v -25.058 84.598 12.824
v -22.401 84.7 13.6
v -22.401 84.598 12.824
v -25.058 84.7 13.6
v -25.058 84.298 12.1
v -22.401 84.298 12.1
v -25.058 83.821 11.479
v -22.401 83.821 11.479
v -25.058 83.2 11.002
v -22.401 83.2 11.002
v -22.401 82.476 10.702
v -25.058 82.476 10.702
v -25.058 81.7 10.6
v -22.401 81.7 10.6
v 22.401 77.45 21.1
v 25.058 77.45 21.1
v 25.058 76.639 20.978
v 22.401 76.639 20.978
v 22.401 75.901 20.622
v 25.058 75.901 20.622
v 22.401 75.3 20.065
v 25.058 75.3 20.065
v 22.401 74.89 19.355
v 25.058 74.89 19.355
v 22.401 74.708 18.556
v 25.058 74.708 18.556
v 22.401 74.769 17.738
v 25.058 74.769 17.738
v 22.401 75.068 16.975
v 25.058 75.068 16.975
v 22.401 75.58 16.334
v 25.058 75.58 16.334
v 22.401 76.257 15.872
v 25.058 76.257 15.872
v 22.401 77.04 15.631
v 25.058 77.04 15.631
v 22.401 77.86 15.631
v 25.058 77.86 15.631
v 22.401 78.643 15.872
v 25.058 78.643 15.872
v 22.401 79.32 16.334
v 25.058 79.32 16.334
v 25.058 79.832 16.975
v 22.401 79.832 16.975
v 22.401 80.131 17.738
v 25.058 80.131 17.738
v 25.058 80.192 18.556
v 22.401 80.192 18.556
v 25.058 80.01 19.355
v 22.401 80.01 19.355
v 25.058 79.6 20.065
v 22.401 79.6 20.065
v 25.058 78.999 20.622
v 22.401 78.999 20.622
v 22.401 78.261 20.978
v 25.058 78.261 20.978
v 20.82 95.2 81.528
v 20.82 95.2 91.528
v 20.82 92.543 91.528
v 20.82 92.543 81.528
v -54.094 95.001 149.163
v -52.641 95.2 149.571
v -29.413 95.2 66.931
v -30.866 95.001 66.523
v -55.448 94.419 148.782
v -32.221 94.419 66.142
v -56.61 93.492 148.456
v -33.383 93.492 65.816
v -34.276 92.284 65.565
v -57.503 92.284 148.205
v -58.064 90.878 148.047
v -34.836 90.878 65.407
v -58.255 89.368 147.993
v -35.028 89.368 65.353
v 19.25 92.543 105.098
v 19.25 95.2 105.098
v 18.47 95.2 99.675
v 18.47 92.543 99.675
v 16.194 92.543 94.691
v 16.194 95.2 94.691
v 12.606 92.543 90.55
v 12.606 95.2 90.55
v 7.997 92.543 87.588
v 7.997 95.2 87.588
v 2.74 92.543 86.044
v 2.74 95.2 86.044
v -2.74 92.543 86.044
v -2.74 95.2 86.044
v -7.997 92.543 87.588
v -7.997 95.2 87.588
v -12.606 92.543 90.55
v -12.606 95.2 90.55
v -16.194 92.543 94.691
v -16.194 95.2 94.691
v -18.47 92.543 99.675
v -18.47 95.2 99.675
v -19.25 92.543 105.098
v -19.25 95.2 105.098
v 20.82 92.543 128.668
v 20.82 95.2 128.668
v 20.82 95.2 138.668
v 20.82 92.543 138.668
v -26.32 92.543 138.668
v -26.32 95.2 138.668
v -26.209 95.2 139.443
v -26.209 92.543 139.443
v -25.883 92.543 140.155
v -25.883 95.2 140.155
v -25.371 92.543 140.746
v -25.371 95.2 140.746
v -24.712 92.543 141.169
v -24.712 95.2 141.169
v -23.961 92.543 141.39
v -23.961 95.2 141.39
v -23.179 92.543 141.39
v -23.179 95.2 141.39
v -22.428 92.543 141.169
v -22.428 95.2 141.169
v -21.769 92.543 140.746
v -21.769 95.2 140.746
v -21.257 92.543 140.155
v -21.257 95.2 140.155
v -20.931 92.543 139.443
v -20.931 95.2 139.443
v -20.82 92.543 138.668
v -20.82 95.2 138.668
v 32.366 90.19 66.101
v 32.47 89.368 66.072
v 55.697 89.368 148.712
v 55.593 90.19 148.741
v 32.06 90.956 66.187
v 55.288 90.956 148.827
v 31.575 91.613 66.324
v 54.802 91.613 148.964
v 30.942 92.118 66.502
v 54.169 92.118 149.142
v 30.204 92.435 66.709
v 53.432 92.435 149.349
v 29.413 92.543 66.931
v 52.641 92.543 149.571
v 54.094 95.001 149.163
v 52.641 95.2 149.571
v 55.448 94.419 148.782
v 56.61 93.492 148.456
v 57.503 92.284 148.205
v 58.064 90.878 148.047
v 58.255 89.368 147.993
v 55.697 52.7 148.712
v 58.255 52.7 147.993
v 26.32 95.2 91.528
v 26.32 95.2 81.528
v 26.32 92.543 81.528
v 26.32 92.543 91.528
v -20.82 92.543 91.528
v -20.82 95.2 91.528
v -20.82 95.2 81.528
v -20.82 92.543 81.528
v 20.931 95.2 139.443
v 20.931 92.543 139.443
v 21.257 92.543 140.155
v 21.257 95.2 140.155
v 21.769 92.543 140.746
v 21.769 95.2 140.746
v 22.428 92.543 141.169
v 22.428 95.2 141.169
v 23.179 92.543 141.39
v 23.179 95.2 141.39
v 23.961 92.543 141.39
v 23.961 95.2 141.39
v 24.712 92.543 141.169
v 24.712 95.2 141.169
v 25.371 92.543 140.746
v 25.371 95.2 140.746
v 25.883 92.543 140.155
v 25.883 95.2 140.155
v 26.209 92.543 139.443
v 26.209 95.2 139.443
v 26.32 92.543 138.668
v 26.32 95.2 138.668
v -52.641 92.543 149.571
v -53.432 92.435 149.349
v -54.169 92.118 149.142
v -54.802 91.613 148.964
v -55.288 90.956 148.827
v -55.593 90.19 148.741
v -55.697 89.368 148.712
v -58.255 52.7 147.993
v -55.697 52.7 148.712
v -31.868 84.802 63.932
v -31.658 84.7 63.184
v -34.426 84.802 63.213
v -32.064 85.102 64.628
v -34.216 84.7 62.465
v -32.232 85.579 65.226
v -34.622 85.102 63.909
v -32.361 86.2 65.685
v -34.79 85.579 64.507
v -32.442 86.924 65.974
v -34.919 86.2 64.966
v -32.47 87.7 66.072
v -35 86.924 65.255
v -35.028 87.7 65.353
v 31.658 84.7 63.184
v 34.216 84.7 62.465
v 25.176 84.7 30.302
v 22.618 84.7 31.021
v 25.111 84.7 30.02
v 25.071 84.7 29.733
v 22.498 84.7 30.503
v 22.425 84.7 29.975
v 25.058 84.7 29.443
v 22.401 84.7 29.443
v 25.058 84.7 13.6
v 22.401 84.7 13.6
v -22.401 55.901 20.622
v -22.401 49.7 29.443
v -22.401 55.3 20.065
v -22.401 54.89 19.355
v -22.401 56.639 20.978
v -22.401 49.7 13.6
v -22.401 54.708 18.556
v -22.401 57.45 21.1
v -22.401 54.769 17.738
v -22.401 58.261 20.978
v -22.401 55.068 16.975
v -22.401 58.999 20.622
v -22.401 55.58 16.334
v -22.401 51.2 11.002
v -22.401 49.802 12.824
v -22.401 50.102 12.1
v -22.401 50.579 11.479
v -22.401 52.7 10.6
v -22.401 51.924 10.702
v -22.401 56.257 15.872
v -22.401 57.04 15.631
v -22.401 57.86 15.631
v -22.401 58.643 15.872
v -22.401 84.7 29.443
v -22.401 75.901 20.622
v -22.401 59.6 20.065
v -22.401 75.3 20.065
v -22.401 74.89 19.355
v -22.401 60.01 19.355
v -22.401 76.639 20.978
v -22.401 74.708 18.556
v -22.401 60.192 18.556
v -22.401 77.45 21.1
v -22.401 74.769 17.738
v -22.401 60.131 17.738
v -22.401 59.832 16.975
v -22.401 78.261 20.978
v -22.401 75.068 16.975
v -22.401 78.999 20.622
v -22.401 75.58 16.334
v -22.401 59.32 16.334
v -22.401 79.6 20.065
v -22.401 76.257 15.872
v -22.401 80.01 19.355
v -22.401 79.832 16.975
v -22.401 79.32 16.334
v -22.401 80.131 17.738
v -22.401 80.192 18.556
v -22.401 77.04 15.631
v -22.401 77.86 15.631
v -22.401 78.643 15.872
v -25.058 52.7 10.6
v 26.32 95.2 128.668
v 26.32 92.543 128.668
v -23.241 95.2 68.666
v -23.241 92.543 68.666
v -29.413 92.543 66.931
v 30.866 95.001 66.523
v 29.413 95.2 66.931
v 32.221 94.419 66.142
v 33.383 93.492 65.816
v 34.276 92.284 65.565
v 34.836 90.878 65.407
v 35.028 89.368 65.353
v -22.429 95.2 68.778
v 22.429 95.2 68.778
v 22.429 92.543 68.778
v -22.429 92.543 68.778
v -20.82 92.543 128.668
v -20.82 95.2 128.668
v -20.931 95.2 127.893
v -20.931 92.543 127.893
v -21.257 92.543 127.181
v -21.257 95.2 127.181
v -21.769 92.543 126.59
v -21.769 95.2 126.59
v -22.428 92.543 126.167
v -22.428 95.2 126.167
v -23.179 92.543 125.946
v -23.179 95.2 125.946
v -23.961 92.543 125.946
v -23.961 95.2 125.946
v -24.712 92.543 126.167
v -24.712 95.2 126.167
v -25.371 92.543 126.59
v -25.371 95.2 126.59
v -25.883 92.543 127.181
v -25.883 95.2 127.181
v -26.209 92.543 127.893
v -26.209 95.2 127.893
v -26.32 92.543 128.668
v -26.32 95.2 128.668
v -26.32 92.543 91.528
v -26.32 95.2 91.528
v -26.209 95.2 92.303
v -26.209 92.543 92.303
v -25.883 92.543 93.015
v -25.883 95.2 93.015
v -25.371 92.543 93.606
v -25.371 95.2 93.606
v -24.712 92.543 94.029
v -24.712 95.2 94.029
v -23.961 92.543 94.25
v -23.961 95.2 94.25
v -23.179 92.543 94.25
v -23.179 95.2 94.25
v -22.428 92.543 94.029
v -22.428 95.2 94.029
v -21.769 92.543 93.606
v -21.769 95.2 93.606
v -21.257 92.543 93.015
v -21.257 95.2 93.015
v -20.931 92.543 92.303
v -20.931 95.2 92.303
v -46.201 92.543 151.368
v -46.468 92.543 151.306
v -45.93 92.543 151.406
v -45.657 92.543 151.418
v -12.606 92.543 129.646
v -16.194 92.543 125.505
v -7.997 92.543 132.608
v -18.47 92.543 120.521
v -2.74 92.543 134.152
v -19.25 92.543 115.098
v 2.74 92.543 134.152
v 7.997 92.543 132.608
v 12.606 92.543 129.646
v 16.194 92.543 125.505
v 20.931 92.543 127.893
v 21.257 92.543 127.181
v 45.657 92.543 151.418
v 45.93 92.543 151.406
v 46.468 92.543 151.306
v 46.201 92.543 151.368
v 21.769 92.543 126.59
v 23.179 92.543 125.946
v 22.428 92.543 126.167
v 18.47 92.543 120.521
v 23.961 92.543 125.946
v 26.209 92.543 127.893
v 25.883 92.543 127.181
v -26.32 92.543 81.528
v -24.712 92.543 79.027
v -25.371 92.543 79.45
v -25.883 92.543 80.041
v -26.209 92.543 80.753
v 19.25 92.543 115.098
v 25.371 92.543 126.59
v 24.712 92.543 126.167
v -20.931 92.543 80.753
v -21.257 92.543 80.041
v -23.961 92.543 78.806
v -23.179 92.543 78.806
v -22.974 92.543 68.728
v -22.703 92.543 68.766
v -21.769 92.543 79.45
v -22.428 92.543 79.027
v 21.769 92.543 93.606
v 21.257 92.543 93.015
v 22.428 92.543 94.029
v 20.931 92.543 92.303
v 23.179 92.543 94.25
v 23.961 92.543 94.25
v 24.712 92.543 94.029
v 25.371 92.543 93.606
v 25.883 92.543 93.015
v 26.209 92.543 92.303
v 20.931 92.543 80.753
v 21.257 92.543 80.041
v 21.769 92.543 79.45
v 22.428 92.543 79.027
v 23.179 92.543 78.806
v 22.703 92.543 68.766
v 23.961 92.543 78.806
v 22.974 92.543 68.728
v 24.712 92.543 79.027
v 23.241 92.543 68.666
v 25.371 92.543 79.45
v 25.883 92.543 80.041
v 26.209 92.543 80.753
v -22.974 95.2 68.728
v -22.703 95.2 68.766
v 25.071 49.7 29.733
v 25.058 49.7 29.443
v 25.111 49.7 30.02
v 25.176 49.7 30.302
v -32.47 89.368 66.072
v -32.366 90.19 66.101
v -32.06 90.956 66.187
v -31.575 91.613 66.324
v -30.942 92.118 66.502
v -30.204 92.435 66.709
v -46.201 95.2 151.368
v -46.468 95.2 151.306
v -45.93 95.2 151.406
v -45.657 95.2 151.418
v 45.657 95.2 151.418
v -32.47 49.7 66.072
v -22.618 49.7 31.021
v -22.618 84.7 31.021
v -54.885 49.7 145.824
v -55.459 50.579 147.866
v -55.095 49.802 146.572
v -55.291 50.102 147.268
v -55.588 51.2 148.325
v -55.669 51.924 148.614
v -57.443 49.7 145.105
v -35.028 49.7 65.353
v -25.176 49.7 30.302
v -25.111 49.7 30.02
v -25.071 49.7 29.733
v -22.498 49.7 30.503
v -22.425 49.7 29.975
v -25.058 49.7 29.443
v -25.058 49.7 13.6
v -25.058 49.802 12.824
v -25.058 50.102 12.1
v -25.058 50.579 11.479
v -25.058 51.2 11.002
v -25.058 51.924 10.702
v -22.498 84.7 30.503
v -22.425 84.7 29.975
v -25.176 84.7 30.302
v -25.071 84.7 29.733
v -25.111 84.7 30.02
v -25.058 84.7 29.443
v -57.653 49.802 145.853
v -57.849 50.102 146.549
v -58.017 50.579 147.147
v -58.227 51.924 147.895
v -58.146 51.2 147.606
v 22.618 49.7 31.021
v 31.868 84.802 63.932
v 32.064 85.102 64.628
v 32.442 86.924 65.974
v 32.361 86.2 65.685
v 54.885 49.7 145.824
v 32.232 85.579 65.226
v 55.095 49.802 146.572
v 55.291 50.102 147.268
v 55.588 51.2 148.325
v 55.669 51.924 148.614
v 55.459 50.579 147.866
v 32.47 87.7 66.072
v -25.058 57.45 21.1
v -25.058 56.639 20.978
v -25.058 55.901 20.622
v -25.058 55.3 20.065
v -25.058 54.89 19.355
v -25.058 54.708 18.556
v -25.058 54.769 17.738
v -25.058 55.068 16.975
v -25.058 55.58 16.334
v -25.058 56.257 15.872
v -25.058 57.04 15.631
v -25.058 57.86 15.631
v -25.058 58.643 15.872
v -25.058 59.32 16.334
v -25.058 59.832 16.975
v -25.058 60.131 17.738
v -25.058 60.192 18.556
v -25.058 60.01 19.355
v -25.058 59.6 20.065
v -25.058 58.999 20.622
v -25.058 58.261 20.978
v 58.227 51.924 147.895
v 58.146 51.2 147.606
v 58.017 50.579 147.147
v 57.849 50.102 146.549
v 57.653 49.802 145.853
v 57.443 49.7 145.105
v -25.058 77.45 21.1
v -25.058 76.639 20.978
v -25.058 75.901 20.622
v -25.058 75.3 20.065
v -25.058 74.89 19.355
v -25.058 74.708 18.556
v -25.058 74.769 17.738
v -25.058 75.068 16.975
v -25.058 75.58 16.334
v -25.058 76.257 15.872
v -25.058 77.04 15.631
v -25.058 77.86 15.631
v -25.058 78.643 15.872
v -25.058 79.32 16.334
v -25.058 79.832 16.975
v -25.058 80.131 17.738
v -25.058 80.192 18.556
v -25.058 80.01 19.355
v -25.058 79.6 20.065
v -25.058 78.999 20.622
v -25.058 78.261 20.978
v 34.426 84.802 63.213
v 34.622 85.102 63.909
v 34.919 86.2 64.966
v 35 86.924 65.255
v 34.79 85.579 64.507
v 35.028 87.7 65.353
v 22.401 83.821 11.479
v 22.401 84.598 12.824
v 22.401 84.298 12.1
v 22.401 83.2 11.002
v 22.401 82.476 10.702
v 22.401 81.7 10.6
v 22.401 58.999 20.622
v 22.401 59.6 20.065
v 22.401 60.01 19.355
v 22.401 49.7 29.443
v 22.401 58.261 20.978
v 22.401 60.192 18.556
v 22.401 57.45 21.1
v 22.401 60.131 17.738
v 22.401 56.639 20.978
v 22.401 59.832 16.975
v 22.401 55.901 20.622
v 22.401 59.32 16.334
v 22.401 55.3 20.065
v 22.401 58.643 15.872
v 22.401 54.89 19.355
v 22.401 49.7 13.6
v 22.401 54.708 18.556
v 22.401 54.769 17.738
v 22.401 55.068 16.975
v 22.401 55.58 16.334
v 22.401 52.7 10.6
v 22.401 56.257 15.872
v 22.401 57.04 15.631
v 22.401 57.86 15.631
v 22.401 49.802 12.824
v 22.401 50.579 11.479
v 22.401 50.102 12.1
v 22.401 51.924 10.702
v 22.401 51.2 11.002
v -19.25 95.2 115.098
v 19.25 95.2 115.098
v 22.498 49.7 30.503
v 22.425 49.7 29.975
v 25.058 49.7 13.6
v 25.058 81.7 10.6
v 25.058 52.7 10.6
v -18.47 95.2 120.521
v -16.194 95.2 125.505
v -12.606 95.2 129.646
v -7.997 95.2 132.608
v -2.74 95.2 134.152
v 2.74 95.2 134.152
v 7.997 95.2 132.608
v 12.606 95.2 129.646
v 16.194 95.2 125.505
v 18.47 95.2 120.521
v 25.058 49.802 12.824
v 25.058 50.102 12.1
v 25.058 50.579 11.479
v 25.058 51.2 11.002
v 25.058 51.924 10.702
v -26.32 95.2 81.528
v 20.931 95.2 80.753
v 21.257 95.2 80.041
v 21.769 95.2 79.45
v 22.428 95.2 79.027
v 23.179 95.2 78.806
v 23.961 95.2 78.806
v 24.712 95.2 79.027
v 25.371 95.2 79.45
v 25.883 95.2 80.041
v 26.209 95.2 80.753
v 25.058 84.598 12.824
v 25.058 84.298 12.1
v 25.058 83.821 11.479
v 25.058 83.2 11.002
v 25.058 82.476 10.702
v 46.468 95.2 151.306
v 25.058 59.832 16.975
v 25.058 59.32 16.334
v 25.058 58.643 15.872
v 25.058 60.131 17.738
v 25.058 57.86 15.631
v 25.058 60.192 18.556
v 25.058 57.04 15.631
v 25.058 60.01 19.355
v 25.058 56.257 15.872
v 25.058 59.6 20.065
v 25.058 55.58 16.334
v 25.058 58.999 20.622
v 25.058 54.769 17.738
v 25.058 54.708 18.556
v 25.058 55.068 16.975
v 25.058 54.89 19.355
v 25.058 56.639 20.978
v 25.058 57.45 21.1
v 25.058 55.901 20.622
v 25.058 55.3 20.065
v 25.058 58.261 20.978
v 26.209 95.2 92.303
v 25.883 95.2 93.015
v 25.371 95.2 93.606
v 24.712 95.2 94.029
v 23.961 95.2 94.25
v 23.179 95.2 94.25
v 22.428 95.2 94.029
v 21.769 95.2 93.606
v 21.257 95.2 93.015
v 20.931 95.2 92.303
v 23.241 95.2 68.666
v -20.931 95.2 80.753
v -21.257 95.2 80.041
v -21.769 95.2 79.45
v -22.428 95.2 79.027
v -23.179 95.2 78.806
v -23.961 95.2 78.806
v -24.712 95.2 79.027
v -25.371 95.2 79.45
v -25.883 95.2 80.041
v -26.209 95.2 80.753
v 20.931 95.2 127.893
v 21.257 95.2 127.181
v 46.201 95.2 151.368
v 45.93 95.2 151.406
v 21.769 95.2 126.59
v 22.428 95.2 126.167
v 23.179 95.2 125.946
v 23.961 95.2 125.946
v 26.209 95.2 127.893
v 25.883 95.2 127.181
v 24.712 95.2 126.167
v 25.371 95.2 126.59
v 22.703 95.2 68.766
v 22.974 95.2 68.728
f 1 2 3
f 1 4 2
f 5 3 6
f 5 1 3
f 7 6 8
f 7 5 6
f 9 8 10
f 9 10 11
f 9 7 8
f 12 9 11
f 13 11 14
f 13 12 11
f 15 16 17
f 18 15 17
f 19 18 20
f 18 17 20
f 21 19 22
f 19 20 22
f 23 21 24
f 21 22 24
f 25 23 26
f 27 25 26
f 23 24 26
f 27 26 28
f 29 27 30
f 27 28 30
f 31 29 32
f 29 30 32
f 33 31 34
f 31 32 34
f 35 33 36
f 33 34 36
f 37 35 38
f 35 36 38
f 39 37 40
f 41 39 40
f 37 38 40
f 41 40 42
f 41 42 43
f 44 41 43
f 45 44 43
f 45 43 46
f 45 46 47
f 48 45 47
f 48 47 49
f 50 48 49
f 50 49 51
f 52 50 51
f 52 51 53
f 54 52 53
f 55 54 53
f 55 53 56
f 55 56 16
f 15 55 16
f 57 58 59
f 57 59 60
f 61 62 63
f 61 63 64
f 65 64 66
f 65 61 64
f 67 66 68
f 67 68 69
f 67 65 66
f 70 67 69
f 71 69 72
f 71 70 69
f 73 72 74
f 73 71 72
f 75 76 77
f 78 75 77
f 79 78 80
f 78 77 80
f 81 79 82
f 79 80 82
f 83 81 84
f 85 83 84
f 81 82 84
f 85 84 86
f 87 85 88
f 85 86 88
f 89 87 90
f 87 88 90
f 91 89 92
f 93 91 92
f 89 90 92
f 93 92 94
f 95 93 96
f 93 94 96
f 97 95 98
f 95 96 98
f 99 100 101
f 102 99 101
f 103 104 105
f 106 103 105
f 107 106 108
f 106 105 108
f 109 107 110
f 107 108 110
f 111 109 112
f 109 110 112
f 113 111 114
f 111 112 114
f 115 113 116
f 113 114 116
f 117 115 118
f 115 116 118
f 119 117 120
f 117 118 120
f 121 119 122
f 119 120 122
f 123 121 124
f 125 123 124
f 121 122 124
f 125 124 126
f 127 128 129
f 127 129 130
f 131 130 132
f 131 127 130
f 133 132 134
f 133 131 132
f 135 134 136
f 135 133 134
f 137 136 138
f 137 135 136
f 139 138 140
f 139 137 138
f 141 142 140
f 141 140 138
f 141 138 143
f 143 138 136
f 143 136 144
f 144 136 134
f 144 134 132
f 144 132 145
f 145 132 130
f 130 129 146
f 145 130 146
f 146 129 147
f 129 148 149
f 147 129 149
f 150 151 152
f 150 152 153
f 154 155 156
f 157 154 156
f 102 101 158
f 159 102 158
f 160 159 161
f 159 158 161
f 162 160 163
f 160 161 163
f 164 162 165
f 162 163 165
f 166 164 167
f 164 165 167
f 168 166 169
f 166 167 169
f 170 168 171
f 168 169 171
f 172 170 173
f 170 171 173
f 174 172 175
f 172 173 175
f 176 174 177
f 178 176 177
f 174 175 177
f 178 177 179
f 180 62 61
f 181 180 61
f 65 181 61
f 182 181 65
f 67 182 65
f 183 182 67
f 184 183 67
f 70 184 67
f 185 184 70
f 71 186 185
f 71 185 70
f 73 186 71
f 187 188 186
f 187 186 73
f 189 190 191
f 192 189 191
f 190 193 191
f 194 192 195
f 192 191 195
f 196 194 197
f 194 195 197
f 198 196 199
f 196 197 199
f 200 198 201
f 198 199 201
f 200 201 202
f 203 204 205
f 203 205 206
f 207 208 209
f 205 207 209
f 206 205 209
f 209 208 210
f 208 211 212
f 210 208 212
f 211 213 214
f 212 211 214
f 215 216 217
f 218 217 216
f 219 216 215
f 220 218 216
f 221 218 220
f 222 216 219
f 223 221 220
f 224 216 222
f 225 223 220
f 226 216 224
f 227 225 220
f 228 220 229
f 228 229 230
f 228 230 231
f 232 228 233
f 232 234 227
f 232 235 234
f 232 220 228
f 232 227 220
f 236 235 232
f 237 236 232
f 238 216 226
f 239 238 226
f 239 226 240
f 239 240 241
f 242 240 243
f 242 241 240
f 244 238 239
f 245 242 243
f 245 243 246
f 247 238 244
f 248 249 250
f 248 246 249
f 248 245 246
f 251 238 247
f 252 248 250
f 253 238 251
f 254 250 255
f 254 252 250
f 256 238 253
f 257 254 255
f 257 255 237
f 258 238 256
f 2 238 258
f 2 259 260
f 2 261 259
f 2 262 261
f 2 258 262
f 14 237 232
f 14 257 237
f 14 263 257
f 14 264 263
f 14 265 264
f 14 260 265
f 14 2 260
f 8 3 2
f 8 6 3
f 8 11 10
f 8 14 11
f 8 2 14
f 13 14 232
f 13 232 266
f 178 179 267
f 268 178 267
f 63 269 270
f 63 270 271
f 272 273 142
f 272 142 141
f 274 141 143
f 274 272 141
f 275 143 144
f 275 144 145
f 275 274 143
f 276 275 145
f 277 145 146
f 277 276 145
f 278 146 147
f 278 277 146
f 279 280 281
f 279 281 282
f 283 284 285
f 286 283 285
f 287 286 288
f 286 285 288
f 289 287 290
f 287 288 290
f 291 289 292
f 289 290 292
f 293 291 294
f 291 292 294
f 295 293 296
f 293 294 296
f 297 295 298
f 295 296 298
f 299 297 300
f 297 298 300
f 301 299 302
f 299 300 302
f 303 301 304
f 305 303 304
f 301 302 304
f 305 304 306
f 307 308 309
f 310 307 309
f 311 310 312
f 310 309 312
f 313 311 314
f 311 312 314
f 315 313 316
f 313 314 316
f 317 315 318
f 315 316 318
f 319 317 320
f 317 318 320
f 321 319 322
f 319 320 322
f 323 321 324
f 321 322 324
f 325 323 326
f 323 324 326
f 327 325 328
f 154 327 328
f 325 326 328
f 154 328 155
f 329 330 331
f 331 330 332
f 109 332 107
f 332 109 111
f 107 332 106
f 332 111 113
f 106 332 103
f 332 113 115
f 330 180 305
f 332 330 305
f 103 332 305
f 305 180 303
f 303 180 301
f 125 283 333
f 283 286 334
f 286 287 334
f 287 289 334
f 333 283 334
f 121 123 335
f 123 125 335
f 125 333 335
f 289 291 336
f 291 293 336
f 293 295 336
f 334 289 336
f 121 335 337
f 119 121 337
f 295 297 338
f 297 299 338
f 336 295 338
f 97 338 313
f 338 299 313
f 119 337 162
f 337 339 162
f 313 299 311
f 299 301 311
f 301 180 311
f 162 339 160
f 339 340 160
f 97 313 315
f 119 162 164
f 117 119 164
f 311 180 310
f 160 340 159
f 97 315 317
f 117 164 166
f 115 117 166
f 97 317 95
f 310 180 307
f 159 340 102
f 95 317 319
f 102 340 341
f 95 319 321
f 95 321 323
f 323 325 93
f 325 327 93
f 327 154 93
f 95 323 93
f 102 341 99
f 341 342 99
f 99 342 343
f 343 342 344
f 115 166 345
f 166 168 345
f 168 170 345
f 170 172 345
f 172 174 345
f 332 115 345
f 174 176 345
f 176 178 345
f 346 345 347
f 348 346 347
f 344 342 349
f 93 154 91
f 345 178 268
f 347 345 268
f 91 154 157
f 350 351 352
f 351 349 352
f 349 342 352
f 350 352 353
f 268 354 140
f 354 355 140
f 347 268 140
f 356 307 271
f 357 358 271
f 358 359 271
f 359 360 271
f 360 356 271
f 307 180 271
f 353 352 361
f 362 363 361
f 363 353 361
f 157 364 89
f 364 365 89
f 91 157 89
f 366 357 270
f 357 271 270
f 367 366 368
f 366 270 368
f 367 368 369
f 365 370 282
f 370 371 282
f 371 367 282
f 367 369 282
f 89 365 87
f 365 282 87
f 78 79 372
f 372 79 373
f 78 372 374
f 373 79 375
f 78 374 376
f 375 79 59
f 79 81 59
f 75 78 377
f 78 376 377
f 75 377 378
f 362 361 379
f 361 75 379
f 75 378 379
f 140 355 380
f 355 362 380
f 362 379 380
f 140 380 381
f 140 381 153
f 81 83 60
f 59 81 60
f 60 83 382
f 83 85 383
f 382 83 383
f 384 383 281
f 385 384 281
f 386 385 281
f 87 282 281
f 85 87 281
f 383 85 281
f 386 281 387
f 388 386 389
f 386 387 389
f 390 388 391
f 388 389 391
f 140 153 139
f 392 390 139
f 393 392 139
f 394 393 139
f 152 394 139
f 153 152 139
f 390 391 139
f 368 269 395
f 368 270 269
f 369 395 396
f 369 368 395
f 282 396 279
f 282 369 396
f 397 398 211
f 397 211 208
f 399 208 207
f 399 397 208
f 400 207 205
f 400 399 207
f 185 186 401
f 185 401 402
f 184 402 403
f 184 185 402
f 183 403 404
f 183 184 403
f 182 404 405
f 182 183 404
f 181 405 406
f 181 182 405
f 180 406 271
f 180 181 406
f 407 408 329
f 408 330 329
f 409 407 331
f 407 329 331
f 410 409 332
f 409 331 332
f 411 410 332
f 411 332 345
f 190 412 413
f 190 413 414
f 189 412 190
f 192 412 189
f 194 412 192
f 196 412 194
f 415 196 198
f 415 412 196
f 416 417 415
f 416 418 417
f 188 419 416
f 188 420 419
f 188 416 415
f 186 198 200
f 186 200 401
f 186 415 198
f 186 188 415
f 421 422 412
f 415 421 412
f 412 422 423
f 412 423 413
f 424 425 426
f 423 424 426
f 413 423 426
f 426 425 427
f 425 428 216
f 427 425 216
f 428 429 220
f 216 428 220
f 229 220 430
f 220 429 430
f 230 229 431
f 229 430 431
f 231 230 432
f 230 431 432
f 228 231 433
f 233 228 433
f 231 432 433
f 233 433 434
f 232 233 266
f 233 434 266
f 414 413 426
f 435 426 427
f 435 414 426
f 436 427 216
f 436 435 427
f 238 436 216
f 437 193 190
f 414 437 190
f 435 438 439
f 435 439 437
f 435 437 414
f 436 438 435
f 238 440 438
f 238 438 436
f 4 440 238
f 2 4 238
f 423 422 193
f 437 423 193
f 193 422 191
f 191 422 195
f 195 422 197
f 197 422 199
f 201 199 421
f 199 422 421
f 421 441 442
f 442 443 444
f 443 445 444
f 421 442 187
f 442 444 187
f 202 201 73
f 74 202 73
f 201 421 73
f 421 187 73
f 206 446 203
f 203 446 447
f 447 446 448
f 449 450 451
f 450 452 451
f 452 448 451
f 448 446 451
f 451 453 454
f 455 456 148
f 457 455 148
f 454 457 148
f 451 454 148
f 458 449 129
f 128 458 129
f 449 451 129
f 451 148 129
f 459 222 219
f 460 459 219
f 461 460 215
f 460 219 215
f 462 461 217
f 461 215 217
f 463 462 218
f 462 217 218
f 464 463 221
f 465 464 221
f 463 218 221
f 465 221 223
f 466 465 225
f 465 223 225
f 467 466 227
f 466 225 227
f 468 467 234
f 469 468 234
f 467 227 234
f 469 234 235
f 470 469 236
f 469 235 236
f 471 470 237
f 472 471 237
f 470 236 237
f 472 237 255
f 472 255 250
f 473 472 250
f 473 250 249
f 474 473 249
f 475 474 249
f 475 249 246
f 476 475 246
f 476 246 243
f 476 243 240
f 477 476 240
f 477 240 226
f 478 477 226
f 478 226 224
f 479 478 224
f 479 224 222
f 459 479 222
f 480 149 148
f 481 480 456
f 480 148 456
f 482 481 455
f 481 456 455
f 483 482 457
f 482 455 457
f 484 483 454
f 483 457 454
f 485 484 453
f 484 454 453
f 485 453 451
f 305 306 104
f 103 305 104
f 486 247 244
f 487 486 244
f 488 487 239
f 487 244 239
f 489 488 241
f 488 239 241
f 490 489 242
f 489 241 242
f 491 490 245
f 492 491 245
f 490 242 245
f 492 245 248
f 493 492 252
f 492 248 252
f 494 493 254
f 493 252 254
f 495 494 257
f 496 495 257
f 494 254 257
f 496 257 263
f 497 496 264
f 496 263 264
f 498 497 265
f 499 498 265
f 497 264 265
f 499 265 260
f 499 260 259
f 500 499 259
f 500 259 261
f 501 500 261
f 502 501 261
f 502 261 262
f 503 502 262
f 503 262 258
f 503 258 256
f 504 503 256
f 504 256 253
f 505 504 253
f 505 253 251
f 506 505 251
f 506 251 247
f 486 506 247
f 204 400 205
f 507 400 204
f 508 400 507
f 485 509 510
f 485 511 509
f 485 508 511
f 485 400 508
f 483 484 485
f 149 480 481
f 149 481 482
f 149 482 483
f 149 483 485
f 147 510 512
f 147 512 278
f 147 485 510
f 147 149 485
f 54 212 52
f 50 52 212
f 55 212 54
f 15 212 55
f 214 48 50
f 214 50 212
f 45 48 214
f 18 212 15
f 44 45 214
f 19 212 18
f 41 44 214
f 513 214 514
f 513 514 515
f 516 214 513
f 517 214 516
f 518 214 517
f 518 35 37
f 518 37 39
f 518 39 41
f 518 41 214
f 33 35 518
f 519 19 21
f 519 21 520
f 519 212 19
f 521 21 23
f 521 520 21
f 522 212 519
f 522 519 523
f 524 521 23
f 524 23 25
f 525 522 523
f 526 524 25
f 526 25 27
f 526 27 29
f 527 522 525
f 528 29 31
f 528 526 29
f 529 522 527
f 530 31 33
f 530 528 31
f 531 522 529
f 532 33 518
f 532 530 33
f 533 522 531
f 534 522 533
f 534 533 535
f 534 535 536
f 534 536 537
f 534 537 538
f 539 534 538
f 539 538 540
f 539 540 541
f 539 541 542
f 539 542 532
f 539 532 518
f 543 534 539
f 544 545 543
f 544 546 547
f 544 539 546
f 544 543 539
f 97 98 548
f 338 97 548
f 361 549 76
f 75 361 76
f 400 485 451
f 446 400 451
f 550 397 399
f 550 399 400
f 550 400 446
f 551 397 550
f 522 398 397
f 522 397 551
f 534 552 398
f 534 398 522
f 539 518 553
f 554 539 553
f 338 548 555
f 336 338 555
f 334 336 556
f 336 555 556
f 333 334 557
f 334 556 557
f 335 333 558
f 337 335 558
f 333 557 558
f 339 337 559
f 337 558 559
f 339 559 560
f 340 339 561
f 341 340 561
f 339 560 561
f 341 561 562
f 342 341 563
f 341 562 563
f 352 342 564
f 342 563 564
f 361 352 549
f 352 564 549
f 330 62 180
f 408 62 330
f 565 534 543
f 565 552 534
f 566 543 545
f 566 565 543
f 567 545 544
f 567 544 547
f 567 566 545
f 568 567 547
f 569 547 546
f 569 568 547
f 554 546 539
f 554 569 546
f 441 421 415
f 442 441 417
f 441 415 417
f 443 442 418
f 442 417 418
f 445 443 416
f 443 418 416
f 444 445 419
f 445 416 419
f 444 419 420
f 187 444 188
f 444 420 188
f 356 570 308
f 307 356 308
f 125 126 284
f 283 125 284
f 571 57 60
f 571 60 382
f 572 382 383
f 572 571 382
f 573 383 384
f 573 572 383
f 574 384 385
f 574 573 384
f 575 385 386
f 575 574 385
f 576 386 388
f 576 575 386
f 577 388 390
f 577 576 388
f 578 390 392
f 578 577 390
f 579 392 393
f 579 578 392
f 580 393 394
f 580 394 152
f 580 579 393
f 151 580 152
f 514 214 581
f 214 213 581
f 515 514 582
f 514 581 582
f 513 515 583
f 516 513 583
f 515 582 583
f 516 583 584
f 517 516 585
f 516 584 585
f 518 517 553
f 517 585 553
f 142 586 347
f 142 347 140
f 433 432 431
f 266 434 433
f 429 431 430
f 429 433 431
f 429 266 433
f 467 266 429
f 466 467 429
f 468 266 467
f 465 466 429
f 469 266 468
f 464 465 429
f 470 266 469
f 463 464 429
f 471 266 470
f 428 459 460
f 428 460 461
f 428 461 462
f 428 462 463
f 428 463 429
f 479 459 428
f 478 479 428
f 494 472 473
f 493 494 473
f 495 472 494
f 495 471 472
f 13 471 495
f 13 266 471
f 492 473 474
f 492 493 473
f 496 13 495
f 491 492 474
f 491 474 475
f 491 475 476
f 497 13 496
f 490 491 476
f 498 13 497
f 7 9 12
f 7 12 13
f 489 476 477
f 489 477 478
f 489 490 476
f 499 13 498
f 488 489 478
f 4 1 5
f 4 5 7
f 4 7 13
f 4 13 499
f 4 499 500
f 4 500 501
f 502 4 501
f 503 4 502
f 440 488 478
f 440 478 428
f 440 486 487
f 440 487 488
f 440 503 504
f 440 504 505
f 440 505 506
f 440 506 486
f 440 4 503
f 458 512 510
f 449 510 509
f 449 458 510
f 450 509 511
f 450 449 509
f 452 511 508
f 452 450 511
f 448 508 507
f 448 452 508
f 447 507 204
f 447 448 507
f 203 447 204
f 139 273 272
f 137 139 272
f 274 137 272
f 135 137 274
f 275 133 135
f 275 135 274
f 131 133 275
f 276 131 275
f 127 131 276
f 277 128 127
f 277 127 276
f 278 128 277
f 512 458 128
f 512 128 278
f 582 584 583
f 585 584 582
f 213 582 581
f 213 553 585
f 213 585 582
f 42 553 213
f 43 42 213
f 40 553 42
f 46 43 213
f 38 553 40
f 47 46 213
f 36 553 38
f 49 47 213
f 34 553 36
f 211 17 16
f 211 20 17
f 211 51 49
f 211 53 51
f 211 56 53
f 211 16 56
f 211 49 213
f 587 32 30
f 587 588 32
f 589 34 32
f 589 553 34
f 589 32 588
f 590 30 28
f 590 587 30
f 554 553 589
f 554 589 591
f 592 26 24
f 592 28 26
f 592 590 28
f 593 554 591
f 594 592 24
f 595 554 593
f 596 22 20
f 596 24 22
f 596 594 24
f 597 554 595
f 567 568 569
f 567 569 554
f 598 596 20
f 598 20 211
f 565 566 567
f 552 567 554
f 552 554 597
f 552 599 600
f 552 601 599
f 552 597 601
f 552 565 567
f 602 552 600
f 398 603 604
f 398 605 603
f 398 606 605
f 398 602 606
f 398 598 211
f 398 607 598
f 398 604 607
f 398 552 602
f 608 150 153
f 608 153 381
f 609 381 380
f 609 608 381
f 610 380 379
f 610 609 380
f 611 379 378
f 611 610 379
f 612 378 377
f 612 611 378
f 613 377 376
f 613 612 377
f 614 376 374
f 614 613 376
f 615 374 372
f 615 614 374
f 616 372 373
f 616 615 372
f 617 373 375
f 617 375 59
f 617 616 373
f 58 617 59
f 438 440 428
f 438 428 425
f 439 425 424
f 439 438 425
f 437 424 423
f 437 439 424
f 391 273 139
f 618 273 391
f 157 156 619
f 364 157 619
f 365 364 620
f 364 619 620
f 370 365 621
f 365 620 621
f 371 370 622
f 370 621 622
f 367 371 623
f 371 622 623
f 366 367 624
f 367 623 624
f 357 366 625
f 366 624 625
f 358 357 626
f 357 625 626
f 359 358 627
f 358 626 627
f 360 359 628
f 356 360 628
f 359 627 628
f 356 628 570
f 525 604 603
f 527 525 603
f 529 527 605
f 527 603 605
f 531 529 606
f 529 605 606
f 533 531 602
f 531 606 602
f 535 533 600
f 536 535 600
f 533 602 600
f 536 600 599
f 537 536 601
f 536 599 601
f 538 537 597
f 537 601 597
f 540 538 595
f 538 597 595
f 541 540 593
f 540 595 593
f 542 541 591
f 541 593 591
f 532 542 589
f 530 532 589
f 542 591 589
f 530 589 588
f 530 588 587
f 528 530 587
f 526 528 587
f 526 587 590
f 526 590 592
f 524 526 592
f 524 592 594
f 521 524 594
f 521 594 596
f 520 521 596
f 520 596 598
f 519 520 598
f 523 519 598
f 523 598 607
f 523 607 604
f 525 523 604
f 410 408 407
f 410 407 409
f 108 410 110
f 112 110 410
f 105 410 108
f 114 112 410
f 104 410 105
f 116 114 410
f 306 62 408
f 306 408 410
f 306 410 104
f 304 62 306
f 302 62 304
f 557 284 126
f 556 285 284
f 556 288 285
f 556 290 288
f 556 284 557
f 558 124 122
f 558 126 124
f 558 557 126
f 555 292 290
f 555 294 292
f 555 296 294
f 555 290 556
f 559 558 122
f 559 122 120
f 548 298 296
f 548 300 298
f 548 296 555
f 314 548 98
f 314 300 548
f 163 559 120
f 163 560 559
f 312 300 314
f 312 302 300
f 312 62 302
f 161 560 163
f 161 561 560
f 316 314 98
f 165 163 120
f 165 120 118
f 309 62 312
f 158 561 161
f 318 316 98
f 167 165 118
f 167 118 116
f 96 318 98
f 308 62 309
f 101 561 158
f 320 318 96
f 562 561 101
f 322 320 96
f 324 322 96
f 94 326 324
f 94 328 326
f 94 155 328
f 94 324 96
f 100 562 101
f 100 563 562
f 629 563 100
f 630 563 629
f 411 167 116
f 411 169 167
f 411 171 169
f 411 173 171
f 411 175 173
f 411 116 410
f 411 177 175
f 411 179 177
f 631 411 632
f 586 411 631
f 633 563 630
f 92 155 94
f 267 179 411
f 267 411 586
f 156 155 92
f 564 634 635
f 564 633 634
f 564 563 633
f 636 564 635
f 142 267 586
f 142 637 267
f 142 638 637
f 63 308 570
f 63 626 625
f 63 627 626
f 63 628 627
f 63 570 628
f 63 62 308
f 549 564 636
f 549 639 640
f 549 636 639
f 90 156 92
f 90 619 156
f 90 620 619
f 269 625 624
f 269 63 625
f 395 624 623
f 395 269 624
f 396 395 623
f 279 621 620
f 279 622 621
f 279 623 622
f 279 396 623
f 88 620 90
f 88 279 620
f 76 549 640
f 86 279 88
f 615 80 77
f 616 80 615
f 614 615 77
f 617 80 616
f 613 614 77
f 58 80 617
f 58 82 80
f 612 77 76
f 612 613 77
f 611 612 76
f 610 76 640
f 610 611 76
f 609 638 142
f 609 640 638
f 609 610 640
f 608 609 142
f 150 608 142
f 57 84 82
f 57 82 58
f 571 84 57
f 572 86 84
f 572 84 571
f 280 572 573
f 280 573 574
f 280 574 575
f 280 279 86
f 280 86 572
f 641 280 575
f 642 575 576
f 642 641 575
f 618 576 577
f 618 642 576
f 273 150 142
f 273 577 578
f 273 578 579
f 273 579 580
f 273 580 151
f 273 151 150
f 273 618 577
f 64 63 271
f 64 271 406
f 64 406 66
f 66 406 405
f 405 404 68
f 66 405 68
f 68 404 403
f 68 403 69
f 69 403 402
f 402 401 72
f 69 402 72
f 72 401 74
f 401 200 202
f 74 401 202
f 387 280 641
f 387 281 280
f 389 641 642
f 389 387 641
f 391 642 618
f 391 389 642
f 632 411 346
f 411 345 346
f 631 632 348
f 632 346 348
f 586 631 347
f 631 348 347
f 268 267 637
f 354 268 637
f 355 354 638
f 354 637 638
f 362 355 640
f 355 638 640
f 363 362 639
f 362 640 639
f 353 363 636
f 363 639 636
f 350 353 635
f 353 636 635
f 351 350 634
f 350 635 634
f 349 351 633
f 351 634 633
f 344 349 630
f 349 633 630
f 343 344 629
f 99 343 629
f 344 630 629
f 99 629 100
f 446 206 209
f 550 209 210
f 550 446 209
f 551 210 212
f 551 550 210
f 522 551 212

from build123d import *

# Parameters (mm, degrees)
BASE_FLANGE1_DEPTH             = 2.65684
EDGE_FLANGE2_STRIP_W           = 16.97736
EDGE_FLANGE2_STRIP_H           = 2.65684
EDGE_FLANGE2_STRIP_CUT_DEPTH   = 85.842119192
EDGE_FLANGE2_STRIP_2_W         = 16.97736
EDGE_FLANGE2_STRIP_2_H         = 2.65684
EDGE_FLANGE2_STRIP_CUT_2_DEPTH = 85.842119192
EDGE_FLANGE2_DEPTH             = 85.842119192
EDGE_FLANGE2_BEND_DEPTH        = 85.842119192
SKETCH22_W                     = 2.65684
SKETCH22_H                     = 35
BOSS_EXTRUDE1_DEPTH            = 36.846685
SKETCH24_W                     = 2.65684
SKETCH24_H                     = 35
BOSS_EXTRUDE2_DEPTH            = 36.846685
EDGE_FLANGE3_STRIP_CUT_DEPTH   = 35
EDGE_FLANGE3_DEPTH             = 35
EDGE_FLANGE4_STRIP_CUT_DEPTH   = 35
EDGE_FLANGE4_DEPTH             = 35
SKETCH32_R                     = 2.75
CUT_EXTRUDE1_DEPTH             = 198.310511697
FILLET1_R                      = 3


# Sheet-metal steps are written as plain solids
with BuildPart() as part:
    # Sketch4 → Base-Flange1 (new body)
    with BuildSketch(Plane(origin=(0, 95.2, 0), x_dir=(1, 0, 0), z_dir=(0, 1, 0))):
        Polygon((-55.697100796, -148.712214058), (-46.070125043, -151.418011142), (46.070125043, -151.418011142), (55.697100796, -148.712214058), (32.469965214, -66.072214058), (22.842989462, -68.778011142), (-22.842989462, -68.778011142), (-32.469965214, -66.072214058), align=None)
        with BuildLine():
            Line((-26.32, -128.668011142), (-26.32, -138.668011142))
            ThreePointArc((-26.32, -138.668011142), (-23.57, -141.418011142), (-20.82, -138.668011142))
            Line((-20.82, -138.668011142), (-20.82, -128.668011142))
            ThreePointArc((-20.82, -128.668011142), (-23.57, -125.918011142), (-26.32, -128.668011142))
        make_face(mode=Mode.SUBTRACT)
        with BuildLine():
            Line((20.82, -128.668011142), (20.82, -138.668011142))
            ThreePointArc((20.82, -138.668011142), (23.57, -141.418011142), (26.32, -138.668011142))
            Line((26.32, -138.668011142), (26.32, -128.668011142))
            ThreePointArc((26.32, -128.668011142), (23.57, -125.918011142), (20.82, -128.668011142))
        make_face(mode=Mode.SUBTRACT)
        with BuildLine():
            Line((20.82, -91.528011142), (20.82, -81.528011142))
            ThreePointArc((20.82, -81.528011142), (23.57, -78.778011142), (26.32, -81.528011142))
            Line((26.32, -81.528011142), (26.32, -91.528011142))
            ThreePointArc((26.32, -91.528011142), (23.57, -94.278011142), (20.82, -91.528011142))
        make_face(mode=Mode.SUBTRACT)
        with BuildLine():
            Line((-19.25, -105.098011142), (-19.25, -115.098011142))
            ThreePointArc((-19.25, -115.098011142), (0, -134.348011142), (19.25, -115.098011142))
            Line((19.25, -115.098011142), (19.25, -105.098011142))
            ThreePointArc((19.25, -105.098011142), (0, -85.848011142), (-19.25, -105.098011142))
        make_face(mode=Mode.SUBTRACT)
        with BuildLine():
            Line((-20.82, -91.528011142), (-20.82, -81.528011142))
            ThreePointArc((-20.82, -81.528011142), (-23.57, -78.778011142), (-26.32, -81.528011142))
            Line((-26.32, -81.528011142), (-26.32, -91.528011142))
            ThreePointArc((-26.32, -91.528011142), (-23.57, -94.278011142), (-20.82, -91.528011142))
        make_face(mode=Mode.SUBTRACT)
    extrude(amount=-BASE_FLANGE1_DEPTH)

    # Edge-Flange2 strip (across the edge) → Edge-Flange2 strip cut (cut)
    with BuildSketch(Plane(origin=(32.469965214, 92.54316, 66.072214058), x_dir=(-0.9626975752484609, -3.4914813388431334e-15, 0.2705797084238469), z_dir=(0.2705797084238469, 0, 0.9626975752484609))):
        with Locations((-5.31368, -1.32842)):
            Rectangle(EDGE_FLANGE2_STRIP_W, EDGE_FLANGE2_STRIP_H)
    extrude(amount=EDGE_FLANGE2_STRIP_CUT_DEPTH, mode=Mode.SUBTRACT)

    # Edge-Flange2 strip 2 (across the edge) → Edge-Flange2 strip cut 2 (cut)
    with BuildSketch(Plane(origin=(-55.697100796, 92.54316, 148.712214058), x_dir=(0.9626975752484602, -3.4914813388431334e-15, 0.2705797084238493), z_dir=(0.2705797084238493, 0, -0.9626975752484602))):
        with Locations((-5.31368, -1.32842)):
            Rectangle(EDGE_FLANGE2_STRIP_2_W, EDGE_FLANGE2_STRIP_2_H)
    extrude(amount=EDGE_FLANGE2_STRIP_CUT_2_DEPTH, mode=Mode.SUBTRACT)

    # Edge-Flange2 section (across the edge) → Edge-Flange2 (add)
    with BuildSketch(Plane(origin=(32.469965214, 92.54316, 66.072214058), x_dir=(-0.9626975752484609, -3.4914813388431334e-15, 0.2705797084238469), z_dir=(0.2705797084238469, 0, 0.9626975752484609))):
        with BuildLine():
            Line((-2.65684, 3.175), (-2.65684, 42.84316))
            Line((-2.65684, 42.84316), (0, 42.84316))
            Line((0, 42.84316), (0, 3.175))
            ThreePointArc((0, 3.175), (0.92993597, 0.92993597), (3.175, 0))
            Line((3.175, 0), (3.175, -2.65684))
            ThreePointArc((3.175, -2.65684), (-0.948733611, -0.948733611), (-2.65684, 3.175))
        make_face()
    extrude(amount=EDGE_FLANGE2_DEPTH)

    # Edge-Flange2 section 2 (across the edge) → Edge-Flange2 bend (add)
    with BuildSketch(Plane(origin=(-55.697100796, 92.54316, 148.712214058), x_dir=(0.9626975752484602, -3.4914813388431334e-15, 0.2705797084238493), z_dir=(0.2705797084238493, 0, -0.9626975752484602))):
        with BuildLine():
            Line((-2.65684, 3.175), (-2.65684, 42.84316))
            Line((-2.65684, 42.84316), (0, 42.84316))
            Line((0, 42.84316), (0, 3.175))
            ThreePointArc((0, 3.175), (0.92993597, 0.92993597), (3.175, 0))
            Line((3.175, 0), (3.175, -2.65684))
            ThreePointArc((3.175, -2.65684), (-0.948733611, -0.948733611), (-2.65684, 3.175))
        make_face()
    extrude(amount=EDGE_FLANGE2_BEND_DEPTH)

    # Sketch22 → Boss-Extrude1 (add)
    with BuildSketch(Plane(origin=(19.588150967, 0, 69.69282933), x_dir=(-0.9626975752484609, 0, 0.2705797084238468), z_dir=(-0.2705797084238468, 0, -0.9626975752484609))):
        with Locations((-14.709376365, 67.2)):
            Rectangle(SKETCH22_W, SKETCH22_H)
    extrude(amount=BOSS_EXTRUDE1_DEPTH)

    # Sketch24 → Boss-Extrude2 (add)
    with BuildSketch(Plane(origin=(-19.588150967, 0, 69.69282933), x_dir=(-0.9626975752484602, 0, -0.27057970842384926), z_dir=(0.27057970842384926, 0, -0.9626975752484602))):
        with Locations((14.709376365, 67.2)):
            Rectangle(SKETCH24_W, SKETCH24_H)
    extrude(amount=BOSS_EXTRUDE2_DEPTH)

    # Edge-Flange3 strip (across the edge) → Edge-Flange3 strip cut (cut)
    with BuildSketch(Plane(origin=(25.057733426, 49.7, 29.881113007), x_dir=(1, 0, 0), z_dir=(0, 1, 0))):
        Polygon((-7.033027346, 15.203794832), (-2.439298227, -1.140268474), (0.118435199, -0.421381482), (-4.47529392, 15.922681824), align=None)
    extrude(amount=EDGE_FLANGE3_STRIP_CUT_DEPTH, mode=Mode.SUBTRACT)

    # Edge-Flange3 section (across the edge) → Edge-Flange3 (add)
    with BuildSketch(Plane(origin=(25.057733426, 49.7, 29.881113007), x_dir=(1, 0, 0), z_dir=(0, 1, 0))):
        with BuildLine():
            Line((-2.65684, 0.437709092), (-2.65684, 19.281113007))
            Line((-2.65684, 19.281113007), (0, 19.281113007))
            Line((0, 19.281113007), (0, 0.437709092))
            ThreePointArc((0, 0.437709092), (0.029748162, 0.004101115), (0.118435199, -0.421381482))
            Line((0.118435199, -0.421381482), (-2.439298227, -1.140268474))
            ThreePointArc((-2.439298227, -1.140268474), (-2.602198575, -0.35874204), (-2.65684, 0.437709092))
        make_face()
    extrude(amount=EDGE_FLANGE3_DEPTH)

    # Edge-Flange4 strip (across the edge) → Edge-Flange4 strip cut (cut)
    with BuildSketch(Plane(origin=(-25.057733426, 84.7, 29.881113007), x_dir=(-1, 0, 0), z_dir=(0, -1, 0))):
        Polygon((-7.033027346, 15.203794832), (-2.439298227, -1.140268474), (0.118435199, -0.421381482), (-4.47529392, 15.922681824), align=None)
    extrude(amount=EDGE_FLANGE4_STRIP_CUT_DEPTH, mode=Mode.SUBTRACT)

    # Edge-Flange4 section (across the edge) → Edge-Flange4 (add)
    with BuildSketch(Plane(origin=(-25.057733426, 84.7, 29.881113007), x_dir=(-1, 0, 0), z_dir=(0, -1, 0))):
        with BuildLine():
            Line((-2.65684, 0.437709092), (-2.65684, 19.281113007))
            Line((-2.65684, 19.281113007), (0, 19.281113007))
            Line((0, 19.281113007), (0, 0.437709092))
            ThreePointArc((0, 0.437709092), (0.029748162, 0.004101115), (0.118435199, -0.421381482))
            Line((0.118435199, -0.421381482), (-2.439298227, -1.140268474))
            ThreePointArc((-2.439298227, -1.140268474), (-2.602198575, -0.35874204), (-2.65684, 0.437709092))
        make_face()
    extrude(amount=EDGE_FLANGE4_DEPTH)

    # Sketch32 → Cut-Extrude1 (cut, through all)
    with BuildSketch(Plane(origin=(25.057733426, 0, 0), x_dir=(0, 0, -1), z_dir=(1, 0, 0))):
        with Locations(Location((-18.35, 77.45, 0), (0, 0, 180))):
            Circle(SKETCH32_R)
        with Locations(Location((-18.35, 57.45, 0), (0, 0, 180))):
            Circle(SKETCH32_R)
    extrude(amount=-CUT_EXTRUDE1_DEPTH, mode=Mode.SUBTRACT)

    # Fillet1
    fillet1_edges = [part.edges().sort_by_distance(p)[0] for p in [
        (56.975967508, 49.7, 148.352770562),
        (-22.842989462, 93.87158, 68.778011142),
        (22.842989462, 93.87158, 68.778011142),
        (46.070125043, 93.87158, 151.418011142),
        (-46.070125043, 93.87158, 151.418011142),
        (-56.975967508, 49.7, 148.352770562),
        (33.748831927, 84.7, 65.712770562),
        (-33.748831927, 84.7, 65.712770562),
        (23.729313426, 49.7, 10.6),
        (23.729313426, 84.7, 10.6),
        (-23.729313426, 84.7, 10.6),
        (-23.729313426, 49.7, 10.6),
    ]]
    fillet(fillet1_edges, radius=FILLET1_R)


solid = part.part
